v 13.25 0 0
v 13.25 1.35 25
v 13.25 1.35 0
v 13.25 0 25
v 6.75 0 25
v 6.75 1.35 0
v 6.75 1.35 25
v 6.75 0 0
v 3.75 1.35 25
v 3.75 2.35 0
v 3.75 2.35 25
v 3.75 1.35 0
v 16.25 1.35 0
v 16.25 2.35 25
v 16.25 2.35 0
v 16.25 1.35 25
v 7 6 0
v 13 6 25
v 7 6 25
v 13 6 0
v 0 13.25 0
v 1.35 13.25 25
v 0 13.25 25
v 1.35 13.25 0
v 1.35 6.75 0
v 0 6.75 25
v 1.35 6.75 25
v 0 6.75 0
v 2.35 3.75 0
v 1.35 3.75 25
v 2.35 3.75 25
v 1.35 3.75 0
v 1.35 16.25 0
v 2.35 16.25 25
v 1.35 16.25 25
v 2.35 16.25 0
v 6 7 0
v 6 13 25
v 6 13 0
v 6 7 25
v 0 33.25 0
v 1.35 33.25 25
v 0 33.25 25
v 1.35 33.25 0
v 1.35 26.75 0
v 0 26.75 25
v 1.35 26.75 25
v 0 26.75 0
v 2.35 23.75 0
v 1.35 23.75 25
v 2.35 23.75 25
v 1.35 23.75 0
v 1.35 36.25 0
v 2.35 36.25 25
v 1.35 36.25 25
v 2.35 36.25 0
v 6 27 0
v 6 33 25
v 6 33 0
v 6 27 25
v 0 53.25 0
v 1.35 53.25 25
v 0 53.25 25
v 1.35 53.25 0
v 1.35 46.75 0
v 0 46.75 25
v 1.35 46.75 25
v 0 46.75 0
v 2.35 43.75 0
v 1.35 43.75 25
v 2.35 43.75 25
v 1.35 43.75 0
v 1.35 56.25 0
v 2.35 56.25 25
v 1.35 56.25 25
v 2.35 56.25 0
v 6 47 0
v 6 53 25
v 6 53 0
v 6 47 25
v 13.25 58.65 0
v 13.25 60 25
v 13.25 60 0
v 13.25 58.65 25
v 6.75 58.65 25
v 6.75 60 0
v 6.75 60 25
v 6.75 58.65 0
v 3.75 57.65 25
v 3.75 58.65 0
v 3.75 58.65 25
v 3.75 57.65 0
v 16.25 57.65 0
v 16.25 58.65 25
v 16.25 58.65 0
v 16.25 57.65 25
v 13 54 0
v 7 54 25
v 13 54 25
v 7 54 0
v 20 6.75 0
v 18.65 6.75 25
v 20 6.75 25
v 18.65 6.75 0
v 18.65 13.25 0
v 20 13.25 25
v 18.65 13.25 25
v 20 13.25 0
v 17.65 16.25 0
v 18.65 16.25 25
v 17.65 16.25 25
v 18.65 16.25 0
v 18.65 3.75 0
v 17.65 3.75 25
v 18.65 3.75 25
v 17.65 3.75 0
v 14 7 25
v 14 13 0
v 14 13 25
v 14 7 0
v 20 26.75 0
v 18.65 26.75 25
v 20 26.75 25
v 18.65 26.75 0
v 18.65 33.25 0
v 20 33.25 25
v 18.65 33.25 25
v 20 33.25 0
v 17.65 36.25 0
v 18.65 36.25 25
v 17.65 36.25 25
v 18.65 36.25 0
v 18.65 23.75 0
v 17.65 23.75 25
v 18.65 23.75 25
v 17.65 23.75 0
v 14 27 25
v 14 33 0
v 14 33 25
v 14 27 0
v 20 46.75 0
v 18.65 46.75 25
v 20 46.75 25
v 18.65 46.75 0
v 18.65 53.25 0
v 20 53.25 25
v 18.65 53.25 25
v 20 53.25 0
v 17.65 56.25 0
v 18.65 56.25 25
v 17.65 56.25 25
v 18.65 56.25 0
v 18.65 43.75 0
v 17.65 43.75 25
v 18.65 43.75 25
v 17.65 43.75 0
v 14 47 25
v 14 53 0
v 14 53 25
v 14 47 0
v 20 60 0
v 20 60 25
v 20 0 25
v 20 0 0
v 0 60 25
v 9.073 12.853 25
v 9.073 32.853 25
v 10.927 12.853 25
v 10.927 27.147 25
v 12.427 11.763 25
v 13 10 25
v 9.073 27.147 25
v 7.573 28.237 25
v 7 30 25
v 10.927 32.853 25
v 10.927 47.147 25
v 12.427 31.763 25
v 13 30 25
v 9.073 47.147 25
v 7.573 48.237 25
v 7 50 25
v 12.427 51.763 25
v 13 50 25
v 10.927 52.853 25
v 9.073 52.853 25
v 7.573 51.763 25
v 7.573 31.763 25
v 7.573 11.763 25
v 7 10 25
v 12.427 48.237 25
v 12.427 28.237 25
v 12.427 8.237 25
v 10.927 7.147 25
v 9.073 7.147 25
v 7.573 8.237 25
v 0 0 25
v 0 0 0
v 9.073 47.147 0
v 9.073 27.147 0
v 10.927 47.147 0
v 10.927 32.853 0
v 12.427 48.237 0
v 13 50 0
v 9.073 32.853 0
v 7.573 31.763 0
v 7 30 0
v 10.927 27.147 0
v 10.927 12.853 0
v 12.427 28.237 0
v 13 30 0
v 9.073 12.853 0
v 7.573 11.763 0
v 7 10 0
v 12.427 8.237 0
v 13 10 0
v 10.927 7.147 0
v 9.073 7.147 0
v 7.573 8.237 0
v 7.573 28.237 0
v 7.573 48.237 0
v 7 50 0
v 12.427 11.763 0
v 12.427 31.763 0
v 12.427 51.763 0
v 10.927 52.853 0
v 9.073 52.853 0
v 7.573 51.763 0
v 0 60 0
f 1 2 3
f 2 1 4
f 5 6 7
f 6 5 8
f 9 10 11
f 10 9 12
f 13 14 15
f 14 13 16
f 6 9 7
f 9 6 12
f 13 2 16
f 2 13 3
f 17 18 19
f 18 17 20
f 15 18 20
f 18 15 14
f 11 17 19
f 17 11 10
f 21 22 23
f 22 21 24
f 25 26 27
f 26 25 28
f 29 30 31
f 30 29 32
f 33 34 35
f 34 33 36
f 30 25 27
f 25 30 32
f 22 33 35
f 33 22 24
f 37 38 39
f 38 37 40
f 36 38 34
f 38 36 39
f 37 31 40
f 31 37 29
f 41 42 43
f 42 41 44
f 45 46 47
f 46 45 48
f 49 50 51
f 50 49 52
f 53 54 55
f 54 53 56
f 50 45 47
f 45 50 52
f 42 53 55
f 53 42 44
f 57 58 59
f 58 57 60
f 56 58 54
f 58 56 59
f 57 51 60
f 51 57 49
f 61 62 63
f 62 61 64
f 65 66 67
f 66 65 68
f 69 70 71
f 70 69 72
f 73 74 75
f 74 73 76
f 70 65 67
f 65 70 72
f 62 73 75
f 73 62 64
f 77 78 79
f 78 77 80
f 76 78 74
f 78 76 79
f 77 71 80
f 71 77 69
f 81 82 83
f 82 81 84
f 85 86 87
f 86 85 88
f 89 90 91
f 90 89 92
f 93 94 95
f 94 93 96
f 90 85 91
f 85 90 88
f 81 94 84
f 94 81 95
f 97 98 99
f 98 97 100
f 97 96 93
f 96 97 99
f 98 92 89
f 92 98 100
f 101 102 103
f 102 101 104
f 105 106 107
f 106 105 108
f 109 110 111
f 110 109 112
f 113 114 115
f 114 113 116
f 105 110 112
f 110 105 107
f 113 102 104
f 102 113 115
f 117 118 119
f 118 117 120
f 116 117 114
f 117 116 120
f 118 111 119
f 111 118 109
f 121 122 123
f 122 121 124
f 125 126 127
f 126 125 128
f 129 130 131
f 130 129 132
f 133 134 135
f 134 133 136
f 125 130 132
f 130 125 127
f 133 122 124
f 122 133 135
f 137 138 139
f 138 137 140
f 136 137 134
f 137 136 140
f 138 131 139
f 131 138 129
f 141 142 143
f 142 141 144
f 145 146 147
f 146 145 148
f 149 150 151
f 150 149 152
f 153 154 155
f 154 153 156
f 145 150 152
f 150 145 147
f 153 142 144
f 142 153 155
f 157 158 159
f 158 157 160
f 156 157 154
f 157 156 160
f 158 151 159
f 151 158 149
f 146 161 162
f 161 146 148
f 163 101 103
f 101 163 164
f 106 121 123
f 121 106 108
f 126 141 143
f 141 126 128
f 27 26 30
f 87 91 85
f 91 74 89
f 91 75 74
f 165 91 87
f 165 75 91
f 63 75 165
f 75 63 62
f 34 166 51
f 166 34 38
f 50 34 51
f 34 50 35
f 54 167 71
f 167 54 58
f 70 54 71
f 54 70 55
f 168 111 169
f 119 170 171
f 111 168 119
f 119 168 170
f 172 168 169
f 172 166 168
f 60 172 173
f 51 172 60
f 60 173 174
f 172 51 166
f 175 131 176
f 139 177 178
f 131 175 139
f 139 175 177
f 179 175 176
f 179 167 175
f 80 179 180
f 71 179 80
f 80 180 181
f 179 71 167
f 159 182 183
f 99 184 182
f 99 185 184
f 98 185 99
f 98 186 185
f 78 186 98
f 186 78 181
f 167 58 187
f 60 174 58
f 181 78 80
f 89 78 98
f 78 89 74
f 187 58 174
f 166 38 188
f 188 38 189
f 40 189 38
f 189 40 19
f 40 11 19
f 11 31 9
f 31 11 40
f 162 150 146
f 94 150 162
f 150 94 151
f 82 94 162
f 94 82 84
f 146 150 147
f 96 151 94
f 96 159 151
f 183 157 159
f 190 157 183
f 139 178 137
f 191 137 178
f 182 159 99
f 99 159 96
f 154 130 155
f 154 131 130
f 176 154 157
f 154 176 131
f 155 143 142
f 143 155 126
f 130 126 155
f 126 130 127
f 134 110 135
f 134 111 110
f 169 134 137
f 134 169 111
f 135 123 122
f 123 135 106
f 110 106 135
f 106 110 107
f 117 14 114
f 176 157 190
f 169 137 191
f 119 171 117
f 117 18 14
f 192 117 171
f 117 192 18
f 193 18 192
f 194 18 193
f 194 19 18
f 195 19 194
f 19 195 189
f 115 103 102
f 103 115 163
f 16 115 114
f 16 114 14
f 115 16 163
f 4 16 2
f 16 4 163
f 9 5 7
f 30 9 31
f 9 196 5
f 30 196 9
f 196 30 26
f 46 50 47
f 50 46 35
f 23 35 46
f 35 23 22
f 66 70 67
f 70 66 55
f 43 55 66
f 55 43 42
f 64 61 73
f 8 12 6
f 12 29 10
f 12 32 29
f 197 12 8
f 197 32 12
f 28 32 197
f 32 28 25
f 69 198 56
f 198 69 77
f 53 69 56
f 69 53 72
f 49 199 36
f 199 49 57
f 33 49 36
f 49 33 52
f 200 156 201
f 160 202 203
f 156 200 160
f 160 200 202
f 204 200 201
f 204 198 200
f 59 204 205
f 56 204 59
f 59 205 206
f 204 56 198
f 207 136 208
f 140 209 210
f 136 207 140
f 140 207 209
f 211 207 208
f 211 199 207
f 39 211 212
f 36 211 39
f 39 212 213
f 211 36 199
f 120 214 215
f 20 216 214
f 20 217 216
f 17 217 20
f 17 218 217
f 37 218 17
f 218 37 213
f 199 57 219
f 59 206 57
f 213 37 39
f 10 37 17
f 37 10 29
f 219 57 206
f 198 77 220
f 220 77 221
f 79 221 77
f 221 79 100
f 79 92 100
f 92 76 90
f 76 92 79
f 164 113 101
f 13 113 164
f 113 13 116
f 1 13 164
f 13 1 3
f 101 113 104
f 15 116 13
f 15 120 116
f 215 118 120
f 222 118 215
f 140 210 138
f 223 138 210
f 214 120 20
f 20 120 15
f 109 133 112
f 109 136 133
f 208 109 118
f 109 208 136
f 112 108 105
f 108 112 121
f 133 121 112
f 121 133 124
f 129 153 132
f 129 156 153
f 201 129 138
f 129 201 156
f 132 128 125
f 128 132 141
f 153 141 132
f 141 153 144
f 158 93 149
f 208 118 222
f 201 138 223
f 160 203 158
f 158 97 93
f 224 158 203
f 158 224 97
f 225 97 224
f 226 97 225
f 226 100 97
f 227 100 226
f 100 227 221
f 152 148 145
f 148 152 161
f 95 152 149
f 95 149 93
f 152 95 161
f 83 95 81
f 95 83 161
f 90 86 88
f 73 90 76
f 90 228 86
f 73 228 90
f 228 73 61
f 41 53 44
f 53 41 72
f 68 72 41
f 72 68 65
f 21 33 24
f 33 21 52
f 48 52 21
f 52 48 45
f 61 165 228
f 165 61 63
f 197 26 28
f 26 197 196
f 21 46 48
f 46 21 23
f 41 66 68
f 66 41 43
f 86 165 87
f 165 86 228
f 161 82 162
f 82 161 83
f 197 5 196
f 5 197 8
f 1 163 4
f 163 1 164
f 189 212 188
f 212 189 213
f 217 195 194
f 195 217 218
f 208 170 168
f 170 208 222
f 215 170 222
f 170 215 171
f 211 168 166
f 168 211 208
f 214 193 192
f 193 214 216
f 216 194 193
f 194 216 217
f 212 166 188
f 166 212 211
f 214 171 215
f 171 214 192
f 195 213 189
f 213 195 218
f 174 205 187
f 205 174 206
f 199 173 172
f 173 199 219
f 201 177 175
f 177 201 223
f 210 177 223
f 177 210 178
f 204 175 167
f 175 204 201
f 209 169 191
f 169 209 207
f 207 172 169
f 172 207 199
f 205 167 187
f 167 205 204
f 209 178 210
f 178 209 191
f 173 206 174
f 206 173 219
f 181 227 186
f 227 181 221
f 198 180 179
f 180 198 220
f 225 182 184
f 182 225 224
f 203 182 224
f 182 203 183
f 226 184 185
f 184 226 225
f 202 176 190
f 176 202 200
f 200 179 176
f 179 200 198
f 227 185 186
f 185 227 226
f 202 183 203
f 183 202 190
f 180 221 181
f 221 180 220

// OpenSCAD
//Specify the height
Height = 25 ; // [1:1:500]
//Specify the inner diameter
InnerDiameter = 6 ; // [5:1:6]

2060_Profile ();

module 2060_Profile() {
    color ("silver")
    difference () {
        translate ([0,0,0]) cube ([20,60,Height]);
        translate ([10,10,-1]) cylinder(d=InnerDiameter,h=+Height+2);
        translate ([10,30,-1]) cylinder(d=InnerDiameter,h=+Height+2);
        translate ([10,50,-1]) cylinder(d=InnerDiameter,h=+Height+2);

        translate ([0,0,0]) 2020_ProfileCutOut (Height=Height);
        translate ([0,0,0]) mirror ([1,0,0]) rotate ([0,0,90]) 2020_ProfileCutOut (Height=Height);
        translate ([0,20,0]) mirror ([1,0,0]) rotate ([0,0,90]) 2020_ProfileCutOut (Height=Height);
        translate ([0,40,0]) mirror ([1,0,0]) rotate ([0,0,90]) 2020_ProfileCutOut (Height=Height);

        translate ([0,60,0]) mirror ([0,1,0]) 2020_ProfileCutOut (Height=Height);

        translate ([20,20,0]) rotate ([0,0,-90]) mirror ([0,1,0]) 2020_ProfileCutOut (Height=Height);
        translate ([20,40,0]) rotate ([0,0,-90]) mirror ([0,1,0]) 2020_ProfileCutOut (Height=Height);
        translate ([20,60,0]) rotate ([0,0,-90]) mirror ([0,1,0]) 2020_ProfileCutOut (Height=Height);

        *translate ([0,40,0]) 2020_ProfileCutOut (Height=Height);
        *translate ([0,20,0]) mirror ([1,0,0]) rotate ([0,0,90]) 2020_ProfileCutOut (Height=Height);
        *translate ([0,40,0]) mirror ([0,1,0]) 2020_ProfileCutOut (Height=Height);
        *translate ([20,40,0]) rotate ([0,0,-90]) mirror ([0,1,0]) 2020_ProfileCutOut (Height=Height);
    }
}
module 2020_ProfileCutOut () {    
    union () {
        translate ([10-3.25,-0.5,-1]) cube ([6.5,6,Height+2]);
        hull () {
            translate ([10-6.25,1.35,-1]) cube ([12.5,1,Height+2]);
            translate ([10-3,5,-1]) cube ([6,1,Height+2]);
        }
    }
}
